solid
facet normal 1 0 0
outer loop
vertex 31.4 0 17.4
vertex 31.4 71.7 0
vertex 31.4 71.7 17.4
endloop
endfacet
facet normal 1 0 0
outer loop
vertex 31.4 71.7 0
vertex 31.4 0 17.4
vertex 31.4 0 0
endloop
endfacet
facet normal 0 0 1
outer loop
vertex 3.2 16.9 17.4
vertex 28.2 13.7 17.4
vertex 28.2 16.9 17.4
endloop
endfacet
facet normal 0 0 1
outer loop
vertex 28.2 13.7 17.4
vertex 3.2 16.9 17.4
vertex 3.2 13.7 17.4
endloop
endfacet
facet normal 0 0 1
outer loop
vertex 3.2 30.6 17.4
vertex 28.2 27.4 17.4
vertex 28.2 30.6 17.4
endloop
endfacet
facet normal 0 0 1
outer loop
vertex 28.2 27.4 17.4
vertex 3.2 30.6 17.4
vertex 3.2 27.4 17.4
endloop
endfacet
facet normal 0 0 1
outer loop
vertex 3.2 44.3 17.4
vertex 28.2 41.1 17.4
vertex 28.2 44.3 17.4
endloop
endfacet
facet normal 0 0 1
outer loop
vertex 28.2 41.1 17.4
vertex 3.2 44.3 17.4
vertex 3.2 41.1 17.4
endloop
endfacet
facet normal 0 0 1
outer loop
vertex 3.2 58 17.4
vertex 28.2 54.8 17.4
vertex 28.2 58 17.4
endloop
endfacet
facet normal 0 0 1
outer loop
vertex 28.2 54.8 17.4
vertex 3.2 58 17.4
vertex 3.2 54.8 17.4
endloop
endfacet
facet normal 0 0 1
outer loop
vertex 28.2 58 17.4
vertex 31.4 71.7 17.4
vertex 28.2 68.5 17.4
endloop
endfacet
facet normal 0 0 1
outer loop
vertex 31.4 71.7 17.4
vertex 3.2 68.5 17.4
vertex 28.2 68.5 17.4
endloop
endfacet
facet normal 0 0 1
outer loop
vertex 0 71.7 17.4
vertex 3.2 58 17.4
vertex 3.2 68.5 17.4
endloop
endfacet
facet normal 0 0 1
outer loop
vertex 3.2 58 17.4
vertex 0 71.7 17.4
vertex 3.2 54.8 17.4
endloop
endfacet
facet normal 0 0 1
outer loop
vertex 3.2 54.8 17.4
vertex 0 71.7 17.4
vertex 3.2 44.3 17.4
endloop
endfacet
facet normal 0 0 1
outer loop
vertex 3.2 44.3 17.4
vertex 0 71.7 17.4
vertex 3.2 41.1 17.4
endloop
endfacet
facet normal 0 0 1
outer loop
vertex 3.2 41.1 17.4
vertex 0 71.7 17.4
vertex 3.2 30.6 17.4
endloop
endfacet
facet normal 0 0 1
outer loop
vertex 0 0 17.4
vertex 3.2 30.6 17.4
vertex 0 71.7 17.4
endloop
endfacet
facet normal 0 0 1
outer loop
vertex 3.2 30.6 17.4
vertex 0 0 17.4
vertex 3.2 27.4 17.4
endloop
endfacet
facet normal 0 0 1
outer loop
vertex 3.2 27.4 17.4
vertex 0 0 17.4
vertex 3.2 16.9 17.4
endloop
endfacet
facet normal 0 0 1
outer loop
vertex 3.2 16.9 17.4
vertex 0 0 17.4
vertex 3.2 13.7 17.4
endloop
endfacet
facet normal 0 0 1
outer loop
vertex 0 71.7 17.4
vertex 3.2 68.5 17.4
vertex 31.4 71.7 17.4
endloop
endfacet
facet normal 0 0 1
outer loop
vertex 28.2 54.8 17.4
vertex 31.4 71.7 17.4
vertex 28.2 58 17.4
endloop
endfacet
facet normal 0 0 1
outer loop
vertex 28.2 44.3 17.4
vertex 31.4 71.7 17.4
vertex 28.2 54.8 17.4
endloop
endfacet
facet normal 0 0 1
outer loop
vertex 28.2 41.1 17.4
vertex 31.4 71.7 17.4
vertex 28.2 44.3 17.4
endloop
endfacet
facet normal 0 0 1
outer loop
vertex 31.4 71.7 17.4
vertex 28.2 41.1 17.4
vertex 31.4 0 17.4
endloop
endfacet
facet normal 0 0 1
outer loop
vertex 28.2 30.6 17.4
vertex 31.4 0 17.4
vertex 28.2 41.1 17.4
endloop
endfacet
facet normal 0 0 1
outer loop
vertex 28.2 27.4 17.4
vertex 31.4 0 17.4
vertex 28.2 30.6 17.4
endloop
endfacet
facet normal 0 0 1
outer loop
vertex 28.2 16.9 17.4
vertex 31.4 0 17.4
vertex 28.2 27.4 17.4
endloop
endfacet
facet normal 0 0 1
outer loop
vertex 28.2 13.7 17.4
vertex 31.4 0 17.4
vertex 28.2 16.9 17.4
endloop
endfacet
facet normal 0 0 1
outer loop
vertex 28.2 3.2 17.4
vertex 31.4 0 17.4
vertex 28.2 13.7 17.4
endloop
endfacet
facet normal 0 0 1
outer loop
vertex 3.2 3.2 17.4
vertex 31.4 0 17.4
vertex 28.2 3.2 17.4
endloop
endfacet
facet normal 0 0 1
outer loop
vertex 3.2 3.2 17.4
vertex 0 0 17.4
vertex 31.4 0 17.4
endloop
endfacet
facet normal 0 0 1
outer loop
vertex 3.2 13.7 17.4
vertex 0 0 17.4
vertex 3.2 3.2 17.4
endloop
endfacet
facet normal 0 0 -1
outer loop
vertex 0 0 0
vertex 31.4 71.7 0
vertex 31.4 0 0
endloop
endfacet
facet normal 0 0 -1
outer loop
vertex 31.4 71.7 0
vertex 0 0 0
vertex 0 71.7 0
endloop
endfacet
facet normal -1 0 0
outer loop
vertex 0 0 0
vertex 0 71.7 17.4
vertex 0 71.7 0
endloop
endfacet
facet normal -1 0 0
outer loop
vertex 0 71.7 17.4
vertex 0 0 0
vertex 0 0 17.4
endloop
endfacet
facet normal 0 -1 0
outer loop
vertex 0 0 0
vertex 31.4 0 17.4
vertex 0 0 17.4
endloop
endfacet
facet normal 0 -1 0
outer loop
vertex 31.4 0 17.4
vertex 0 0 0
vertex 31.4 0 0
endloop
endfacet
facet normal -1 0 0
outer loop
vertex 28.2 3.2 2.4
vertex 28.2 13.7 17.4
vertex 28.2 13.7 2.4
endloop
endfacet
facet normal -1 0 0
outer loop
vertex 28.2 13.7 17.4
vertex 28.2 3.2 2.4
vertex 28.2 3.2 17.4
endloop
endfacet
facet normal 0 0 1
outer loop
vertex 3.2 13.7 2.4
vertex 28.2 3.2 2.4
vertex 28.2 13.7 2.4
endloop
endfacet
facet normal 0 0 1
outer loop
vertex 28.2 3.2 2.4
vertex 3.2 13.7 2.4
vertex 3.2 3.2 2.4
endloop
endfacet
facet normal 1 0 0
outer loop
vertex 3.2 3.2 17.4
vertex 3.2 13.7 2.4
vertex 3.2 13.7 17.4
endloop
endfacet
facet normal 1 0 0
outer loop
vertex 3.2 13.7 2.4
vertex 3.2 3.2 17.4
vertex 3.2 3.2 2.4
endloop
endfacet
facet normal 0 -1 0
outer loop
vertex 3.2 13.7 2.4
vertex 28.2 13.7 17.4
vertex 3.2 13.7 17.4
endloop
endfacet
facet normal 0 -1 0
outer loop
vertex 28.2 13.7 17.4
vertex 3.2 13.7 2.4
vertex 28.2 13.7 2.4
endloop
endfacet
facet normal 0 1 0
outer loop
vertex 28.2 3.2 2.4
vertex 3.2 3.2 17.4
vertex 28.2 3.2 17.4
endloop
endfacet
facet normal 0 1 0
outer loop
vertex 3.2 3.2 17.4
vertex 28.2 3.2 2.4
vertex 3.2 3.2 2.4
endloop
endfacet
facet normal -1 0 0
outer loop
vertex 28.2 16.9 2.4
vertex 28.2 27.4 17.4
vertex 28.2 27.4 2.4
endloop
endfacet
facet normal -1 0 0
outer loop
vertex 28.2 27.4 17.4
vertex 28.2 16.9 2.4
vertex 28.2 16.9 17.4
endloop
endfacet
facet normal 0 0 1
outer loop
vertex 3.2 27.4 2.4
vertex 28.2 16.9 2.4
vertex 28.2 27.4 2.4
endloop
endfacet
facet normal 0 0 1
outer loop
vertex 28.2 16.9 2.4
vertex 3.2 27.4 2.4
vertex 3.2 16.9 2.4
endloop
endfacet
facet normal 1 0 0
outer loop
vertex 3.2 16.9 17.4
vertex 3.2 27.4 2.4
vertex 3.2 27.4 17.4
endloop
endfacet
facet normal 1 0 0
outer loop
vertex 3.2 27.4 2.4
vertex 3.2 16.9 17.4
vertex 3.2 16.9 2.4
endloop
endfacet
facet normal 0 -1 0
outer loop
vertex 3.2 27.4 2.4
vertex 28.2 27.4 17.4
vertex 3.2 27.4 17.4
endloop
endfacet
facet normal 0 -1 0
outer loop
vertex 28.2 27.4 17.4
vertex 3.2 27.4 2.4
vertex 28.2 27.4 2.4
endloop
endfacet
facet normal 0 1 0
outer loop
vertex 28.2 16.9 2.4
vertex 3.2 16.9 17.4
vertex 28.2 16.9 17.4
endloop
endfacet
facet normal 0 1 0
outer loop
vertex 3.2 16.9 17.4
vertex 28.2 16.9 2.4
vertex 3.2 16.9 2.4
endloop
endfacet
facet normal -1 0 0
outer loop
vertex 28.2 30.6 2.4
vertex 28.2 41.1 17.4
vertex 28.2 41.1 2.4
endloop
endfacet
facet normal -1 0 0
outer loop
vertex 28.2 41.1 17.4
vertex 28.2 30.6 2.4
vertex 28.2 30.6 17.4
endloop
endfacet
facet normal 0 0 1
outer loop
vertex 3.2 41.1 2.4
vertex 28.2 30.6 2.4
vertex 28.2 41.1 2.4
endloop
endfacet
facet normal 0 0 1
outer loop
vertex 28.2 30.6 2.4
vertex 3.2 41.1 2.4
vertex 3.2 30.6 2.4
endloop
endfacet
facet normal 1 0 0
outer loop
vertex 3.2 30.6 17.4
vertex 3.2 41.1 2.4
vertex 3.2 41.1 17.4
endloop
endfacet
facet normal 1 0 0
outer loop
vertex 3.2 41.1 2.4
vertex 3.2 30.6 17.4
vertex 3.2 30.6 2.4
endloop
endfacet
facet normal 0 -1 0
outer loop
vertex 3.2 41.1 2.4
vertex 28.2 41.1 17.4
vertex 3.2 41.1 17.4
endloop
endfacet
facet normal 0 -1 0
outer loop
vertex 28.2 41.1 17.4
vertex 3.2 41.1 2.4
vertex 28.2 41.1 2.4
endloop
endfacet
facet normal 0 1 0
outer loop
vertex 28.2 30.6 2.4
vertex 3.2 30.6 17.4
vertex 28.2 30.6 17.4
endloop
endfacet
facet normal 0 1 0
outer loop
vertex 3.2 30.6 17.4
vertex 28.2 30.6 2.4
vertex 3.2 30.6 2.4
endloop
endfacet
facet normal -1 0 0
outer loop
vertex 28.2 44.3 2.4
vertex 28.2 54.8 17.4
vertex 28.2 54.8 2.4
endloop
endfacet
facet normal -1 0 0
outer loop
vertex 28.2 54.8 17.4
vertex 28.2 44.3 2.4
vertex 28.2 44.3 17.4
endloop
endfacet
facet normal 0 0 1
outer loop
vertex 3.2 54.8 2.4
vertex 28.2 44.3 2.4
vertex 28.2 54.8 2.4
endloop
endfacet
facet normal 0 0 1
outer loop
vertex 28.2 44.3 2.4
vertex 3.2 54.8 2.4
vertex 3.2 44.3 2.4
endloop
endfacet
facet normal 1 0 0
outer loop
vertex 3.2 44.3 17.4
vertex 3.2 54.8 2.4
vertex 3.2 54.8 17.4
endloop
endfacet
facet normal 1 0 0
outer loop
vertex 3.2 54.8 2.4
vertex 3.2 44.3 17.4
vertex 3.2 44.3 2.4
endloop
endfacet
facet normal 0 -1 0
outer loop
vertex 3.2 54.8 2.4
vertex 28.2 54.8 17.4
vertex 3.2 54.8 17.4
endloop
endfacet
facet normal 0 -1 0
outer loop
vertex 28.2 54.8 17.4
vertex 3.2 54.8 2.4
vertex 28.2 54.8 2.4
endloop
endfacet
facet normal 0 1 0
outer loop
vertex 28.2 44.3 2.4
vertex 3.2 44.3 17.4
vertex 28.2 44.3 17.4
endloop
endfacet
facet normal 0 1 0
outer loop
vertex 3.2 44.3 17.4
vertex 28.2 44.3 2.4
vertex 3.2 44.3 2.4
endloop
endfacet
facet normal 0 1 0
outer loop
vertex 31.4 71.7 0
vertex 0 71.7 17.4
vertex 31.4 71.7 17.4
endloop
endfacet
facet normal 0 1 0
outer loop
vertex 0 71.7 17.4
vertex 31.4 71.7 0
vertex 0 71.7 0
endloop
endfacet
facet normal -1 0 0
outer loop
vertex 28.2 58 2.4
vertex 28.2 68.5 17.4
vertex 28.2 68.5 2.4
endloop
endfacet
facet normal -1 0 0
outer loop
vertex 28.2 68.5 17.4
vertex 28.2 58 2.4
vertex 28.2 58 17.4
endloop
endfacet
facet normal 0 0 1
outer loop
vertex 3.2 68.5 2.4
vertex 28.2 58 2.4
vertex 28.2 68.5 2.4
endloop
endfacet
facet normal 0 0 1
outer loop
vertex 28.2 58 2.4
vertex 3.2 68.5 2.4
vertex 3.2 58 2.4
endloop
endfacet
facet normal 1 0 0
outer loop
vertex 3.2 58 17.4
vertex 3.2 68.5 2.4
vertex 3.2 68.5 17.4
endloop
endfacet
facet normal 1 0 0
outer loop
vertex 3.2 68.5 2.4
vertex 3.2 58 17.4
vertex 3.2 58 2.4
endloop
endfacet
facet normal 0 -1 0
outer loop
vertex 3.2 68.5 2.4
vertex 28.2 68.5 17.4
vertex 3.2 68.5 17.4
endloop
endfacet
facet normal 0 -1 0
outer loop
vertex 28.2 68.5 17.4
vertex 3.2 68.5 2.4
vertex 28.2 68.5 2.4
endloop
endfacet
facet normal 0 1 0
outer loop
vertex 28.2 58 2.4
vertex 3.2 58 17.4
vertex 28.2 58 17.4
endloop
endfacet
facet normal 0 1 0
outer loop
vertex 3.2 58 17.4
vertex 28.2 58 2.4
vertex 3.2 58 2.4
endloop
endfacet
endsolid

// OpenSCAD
//Battery width
lipo_w = 25;
//Battery height
lipo_h = 43;
//Battery thickness
lipo_t = 10.5;

//Number of rows
rows = 1;
//Number of lipos in row
lipos_in_row = 5;

//Container walls height
container_wall_h = 15;
//Container walls thickness
container_wall_t = 3.2;
//Container floor height
container_floor_h = 2.4;


module lipo(){
    cube([lipo_w, lipo_t, lipo_h]);
}

module single_lipo_container(){
    difference(){
        cube([lipo_w+2*container_wall_t, lipo_t+2*container_wall_t, container_wall_h+container_floor_h]);
        translate([container_wall_t, container_wall_t, container_floor_h])
        lipo();
    }
}

module lipo_container(){
    for(row_count=[1 : 1 : rows]){
        for(x=[1 : 1 : lipos_in_row]){
            translate([(lipo_w+container_wall_t)*(row_count-1), (lipo_t+container_wall_t)*(x-1), 0])
            single_lipo_container();
        }
    }
}

lipo_container();
